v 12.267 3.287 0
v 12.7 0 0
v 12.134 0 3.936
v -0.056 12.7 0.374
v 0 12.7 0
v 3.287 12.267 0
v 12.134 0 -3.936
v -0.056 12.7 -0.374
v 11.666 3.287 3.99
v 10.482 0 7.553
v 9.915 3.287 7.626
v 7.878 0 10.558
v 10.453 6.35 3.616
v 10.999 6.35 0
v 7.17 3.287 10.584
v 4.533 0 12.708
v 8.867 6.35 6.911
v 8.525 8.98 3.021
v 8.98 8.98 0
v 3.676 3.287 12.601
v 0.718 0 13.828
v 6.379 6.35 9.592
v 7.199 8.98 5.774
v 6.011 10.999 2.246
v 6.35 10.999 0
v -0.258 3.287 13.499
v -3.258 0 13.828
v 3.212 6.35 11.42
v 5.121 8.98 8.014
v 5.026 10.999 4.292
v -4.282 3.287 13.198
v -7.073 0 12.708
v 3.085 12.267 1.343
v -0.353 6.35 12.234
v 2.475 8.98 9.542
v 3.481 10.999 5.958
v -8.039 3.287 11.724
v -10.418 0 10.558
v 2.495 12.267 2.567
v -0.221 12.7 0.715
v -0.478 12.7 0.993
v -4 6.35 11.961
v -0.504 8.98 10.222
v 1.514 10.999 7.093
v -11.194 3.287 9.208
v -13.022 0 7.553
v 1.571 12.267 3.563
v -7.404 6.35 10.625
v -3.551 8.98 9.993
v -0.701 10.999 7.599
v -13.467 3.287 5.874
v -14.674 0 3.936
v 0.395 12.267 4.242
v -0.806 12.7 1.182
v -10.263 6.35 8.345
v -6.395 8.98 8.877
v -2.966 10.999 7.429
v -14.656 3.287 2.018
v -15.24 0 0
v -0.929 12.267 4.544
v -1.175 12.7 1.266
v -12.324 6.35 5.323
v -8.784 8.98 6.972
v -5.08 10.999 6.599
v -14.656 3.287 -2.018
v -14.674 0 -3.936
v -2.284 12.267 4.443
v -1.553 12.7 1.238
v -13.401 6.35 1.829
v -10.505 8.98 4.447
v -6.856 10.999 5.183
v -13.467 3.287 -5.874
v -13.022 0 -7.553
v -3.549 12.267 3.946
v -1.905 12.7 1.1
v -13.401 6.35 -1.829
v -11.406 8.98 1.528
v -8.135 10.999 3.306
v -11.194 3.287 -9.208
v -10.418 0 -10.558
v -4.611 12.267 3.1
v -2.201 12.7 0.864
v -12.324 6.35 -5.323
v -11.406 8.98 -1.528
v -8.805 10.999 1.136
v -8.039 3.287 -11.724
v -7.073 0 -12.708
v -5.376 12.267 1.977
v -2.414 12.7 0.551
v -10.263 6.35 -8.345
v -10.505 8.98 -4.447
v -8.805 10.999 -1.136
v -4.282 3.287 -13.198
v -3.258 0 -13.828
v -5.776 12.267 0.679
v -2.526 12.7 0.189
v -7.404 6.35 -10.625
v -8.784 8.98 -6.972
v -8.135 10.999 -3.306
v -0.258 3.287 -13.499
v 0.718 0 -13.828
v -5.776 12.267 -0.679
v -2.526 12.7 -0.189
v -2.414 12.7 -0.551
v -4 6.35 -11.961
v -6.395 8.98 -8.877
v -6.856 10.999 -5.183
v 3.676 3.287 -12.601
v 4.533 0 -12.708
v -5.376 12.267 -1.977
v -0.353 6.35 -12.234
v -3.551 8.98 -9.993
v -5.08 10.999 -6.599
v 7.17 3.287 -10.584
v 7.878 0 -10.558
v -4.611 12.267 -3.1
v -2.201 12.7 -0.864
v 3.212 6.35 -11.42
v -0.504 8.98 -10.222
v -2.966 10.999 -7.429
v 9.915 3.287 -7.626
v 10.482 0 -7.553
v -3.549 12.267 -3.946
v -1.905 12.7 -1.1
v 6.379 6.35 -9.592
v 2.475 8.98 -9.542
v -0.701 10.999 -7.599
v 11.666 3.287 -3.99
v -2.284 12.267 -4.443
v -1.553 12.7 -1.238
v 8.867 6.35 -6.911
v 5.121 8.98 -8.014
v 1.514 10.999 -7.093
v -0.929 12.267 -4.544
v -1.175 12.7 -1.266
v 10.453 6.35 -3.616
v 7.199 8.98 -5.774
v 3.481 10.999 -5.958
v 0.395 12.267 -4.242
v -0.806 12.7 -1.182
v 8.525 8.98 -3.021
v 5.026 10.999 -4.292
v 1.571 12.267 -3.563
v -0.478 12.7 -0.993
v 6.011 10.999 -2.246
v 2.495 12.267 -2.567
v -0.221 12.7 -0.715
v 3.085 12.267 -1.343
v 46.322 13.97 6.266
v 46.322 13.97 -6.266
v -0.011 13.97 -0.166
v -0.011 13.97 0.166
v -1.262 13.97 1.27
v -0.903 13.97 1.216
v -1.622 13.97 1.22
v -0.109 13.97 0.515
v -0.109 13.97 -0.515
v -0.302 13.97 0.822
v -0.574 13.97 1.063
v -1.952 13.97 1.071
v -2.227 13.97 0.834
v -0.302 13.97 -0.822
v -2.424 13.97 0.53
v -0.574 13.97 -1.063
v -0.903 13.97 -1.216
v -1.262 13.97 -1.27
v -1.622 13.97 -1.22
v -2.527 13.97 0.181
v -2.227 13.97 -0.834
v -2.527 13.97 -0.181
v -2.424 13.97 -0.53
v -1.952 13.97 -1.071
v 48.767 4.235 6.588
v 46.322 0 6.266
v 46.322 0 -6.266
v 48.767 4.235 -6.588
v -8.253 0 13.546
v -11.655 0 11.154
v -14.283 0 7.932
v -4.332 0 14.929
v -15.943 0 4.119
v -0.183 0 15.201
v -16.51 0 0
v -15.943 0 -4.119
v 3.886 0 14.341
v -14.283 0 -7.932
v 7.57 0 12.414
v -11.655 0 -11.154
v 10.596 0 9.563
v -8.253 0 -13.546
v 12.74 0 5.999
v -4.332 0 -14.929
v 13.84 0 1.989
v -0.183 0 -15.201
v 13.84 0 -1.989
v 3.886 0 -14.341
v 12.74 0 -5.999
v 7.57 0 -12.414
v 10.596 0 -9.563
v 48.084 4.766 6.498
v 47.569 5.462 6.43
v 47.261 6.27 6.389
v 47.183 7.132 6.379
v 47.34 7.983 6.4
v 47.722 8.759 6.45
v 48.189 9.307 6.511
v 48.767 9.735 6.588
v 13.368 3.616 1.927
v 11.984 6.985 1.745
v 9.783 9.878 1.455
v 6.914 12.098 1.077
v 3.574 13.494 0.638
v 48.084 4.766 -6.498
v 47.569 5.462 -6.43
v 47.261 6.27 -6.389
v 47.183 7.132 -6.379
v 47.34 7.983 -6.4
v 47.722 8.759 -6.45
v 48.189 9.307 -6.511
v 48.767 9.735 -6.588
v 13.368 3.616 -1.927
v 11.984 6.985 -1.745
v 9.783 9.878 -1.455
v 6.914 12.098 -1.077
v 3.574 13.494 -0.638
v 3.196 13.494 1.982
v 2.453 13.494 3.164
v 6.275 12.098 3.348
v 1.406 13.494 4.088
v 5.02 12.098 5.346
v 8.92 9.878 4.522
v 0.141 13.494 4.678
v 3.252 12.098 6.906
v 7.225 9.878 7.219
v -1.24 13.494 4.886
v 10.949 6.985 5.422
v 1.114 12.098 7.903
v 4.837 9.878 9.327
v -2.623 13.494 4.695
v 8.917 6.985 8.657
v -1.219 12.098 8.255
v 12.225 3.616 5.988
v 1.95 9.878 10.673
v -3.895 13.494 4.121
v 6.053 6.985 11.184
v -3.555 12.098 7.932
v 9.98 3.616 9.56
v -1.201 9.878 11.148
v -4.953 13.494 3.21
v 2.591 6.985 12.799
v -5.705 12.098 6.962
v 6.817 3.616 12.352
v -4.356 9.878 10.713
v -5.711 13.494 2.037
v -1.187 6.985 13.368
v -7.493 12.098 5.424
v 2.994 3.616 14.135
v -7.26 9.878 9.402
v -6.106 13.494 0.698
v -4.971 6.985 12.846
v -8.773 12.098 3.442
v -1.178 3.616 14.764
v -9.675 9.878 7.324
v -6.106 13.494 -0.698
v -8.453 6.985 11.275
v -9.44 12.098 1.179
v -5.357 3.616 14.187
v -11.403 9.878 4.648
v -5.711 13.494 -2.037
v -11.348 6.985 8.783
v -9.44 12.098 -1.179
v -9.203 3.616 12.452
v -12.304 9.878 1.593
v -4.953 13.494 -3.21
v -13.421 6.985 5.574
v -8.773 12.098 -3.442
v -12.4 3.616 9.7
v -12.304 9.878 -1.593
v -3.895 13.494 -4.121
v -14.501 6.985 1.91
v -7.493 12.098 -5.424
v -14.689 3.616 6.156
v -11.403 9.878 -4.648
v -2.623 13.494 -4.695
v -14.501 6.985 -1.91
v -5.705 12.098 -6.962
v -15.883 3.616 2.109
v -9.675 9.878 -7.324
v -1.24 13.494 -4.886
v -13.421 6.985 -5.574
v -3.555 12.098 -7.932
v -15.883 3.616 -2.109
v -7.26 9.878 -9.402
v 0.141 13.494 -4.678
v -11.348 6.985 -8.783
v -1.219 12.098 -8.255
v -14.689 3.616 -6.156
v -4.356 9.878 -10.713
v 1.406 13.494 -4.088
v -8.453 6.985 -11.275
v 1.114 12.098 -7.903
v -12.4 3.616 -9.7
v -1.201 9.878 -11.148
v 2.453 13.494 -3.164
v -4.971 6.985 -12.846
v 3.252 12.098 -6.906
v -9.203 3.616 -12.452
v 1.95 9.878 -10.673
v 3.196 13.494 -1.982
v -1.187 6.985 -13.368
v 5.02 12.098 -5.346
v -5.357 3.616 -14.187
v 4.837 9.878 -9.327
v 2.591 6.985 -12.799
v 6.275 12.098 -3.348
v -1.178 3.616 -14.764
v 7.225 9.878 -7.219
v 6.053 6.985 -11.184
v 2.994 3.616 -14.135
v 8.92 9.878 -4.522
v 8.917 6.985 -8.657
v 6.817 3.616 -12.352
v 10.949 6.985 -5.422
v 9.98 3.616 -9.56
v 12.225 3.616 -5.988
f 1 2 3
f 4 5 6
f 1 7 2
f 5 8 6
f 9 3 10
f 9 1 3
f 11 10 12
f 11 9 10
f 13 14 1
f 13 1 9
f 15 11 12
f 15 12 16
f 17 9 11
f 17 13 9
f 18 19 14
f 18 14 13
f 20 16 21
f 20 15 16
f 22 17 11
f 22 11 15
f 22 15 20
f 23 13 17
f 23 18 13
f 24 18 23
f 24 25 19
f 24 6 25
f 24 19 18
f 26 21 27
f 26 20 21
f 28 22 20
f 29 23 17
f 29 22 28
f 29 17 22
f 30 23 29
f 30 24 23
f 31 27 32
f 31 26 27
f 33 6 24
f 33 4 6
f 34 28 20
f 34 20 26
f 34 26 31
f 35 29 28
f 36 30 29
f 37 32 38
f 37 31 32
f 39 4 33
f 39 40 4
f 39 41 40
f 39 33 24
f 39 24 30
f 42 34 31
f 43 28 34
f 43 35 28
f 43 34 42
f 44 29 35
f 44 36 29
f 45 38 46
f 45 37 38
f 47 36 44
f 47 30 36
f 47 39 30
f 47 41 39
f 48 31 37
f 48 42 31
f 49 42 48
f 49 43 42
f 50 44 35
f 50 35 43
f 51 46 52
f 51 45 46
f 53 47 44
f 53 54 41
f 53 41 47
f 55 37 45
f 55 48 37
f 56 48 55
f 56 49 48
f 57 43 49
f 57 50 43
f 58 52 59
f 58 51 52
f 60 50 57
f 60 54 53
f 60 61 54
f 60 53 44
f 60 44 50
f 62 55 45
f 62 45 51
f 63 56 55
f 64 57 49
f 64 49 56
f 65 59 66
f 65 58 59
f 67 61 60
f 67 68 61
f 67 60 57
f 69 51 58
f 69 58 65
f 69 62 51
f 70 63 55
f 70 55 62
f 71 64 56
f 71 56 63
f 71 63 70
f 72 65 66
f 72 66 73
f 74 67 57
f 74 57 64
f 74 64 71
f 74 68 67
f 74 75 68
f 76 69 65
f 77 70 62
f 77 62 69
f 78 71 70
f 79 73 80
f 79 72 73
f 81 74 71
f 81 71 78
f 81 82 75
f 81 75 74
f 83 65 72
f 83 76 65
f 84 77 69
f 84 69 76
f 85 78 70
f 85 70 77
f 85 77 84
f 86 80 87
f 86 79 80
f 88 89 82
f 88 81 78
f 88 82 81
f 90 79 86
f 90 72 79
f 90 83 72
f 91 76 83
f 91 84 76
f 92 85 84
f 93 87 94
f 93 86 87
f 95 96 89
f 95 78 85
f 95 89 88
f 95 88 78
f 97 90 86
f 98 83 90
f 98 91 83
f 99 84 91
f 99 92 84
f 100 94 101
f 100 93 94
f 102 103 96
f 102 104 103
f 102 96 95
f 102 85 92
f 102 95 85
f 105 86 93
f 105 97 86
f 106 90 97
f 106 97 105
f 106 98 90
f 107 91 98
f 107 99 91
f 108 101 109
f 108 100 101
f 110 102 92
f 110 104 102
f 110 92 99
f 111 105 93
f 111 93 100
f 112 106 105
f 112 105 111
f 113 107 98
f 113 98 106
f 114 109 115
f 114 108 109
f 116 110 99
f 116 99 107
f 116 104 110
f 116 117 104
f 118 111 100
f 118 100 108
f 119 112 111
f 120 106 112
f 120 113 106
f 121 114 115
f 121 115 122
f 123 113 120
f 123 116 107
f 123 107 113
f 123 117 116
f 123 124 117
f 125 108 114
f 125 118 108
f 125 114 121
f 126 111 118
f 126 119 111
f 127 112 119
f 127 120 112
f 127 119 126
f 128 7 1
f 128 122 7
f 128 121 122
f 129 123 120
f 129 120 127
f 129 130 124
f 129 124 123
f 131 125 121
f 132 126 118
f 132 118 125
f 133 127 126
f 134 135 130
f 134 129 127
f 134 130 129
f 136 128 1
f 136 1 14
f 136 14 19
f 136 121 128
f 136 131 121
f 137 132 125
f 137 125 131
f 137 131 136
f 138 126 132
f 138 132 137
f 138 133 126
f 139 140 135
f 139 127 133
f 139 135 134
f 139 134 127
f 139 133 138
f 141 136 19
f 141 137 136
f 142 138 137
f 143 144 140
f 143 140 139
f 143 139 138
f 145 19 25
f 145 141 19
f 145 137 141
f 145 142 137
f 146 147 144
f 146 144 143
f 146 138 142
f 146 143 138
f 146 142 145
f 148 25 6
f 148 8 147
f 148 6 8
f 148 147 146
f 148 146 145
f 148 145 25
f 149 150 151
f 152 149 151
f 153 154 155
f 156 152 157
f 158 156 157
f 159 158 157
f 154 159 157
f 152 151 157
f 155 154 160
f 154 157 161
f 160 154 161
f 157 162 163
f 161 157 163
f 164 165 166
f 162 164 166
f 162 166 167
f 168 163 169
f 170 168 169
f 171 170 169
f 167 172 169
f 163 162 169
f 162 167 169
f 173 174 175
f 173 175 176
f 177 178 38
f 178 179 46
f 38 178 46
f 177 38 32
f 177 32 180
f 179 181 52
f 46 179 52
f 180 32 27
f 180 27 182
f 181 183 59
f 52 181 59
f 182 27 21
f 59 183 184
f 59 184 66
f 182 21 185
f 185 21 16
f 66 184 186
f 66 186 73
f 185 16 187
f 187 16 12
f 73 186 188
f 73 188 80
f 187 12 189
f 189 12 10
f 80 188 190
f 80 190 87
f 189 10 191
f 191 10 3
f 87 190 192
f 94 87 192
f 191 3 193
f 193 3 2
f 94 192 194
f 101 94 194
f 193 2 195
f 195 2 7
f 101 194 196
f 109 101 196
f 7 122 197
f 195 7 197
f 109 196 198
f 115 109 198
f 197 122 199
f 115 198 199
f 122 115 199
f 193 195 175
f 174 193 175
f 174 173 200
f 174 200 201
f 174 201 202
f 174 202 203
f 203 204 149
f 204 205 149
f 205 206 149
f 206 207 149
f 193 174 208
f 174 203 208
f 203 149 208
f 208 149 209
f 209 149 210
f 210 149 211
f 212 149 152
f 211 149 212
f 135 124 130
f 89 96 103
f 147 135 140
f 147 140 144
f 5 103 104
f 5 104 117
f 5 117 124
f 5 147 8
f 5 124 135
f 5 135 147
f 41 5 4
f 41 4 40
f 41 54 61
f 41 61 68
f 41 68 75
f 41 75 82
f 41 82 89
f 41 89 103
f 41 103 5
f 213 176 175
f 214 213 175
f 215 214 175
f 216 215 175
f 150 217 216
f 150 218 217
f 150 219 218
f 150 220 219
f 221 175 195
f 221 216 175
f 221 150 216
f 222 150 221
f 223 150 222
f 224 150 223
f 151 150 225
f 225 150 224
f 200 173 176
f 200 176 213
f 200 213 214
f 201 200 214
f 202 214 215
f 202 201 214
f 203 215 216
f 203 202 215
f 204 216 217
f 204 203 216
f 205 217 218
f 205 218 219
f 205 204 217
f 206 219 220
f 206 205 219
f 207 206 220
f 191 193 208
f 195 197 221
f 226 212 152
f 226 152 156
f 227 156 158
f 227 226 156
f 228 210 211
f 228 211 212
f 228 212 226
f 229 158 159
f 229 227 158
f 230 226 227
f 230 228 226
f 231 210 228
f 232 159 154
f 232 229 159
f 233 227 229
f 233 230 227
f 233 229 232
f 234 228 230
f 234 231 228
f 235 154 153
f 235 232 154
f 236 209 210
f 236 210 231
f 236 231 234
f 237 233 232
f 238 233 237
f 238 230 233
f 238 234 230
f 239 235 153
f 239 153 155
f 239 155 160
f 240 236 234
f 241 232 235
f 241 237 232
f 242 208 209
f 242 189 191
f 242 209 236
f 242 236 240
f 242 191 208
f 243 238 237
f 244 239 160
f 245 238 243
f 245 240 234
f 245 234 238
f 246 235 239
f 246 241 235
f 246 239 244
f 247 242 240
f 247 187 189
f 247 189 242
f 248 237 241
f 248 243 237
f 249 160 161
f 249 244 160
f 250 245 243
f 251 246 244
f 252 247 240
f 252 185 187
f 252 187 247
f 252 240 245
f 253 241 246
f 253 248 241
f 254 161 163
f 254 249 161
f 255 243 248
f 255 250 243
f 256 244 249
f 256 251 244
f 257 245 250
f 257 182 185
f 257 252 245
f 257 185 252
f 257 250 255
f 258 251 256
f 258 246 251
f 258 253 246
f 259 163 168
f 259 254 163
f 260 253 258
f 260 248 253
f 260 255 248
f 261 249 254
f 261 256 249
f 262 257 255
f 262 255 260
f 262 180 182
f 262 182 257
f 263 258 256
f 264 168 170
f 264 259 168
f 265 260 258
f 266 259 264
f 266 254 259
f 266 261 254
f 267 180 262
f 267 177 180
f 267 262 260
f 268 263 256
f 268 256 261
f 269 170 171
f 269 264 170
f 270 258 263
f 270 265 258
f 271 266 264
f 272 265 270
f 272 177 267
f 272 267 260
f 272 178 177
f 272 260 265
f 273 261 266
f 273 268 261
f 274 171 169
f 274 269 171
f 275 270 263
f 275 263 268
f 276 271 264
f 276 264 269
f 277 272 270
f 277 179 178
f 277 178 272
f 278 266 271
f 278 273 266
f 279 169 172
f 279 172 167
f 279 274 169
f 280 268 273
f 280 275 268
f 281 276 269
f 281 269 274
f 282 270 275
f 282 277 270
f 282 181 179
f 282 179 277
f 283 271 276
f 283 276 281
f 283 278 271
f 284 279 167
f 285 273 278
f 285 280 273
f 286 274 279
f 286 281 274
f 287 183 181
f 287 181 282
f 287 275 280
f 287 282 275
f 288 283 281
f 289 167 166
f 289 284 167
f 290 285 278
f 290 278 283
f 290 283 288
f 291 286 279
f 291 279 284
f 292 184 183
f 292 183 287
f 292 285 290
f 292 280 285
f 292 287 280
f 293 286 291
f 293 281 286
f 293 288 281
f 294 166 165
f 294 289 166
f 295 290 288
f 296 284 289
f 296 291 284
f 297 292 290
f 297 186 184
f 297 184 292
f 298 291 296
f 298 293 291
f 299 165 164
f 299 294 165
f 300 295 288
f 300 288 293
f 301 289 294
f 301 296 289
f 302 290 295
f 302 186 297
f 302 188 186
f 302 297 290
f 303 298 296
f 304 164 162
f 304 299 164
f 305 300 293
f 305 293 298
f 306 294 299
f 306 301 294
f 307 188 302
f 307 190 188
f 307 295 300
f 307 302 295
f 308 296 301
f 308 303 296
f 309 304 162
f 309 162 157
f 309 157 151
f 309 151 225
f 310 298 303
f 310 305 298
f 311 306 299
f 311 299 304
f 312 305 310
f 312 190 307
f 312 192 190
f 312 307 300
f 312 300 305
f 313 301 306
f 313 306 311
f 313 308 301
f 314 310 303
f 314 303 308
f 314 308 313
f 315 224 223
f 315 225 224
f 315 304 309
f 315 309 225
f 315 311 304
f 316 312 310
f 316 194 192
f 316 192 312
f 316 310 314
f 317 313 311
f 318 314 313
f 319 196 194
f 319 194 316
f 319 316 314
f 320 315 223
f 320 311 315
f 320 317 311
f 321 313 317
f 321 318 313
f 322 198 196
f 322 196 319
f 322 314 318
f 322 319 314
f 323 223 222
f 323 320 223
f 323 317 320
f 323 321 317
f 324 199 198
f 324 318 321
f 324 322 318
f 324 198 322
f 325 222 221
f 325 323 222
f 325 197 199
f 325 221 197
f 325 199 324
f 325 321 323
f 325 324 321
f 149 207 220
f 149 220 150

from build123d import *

# Parameters (mm, degrees)
REVOLVE2_ANGLE           = 7.5
REVOLVE2_OTHER_WAY_ANGLE = 7.5
CUT_EXTRUDE1_DEPTH       = 16.24
CUT_EXTRUDE1_DEPTH_BACK  = 16.24


with BuildPart() as part:
    # Sketch1 → Revolve1 (revolve)
    with BuildSketch(Plane.XY):
        with BuildLine():
            Line((0, 12.7), (-1.27, 12.7))
            Line((-1.27, 12.7), (-1.27, 13.97))
            Line((-1.27, 13.97), (0, 13.97))
            ThreePointArc((0, 13.97), (9.878281733, 9.878281733), (13.97, 0))
            Line((13.97, 0), (12.7, 0))
            ThreePointArc((12.7, 0), (8.980256121, 8.980256121), (0, 12.7))
        make_face()
    revolve(axis=Axis((-1.27, 13.97, 0), (0, -1, 0)))

    # Sketch3 → Revolve2 (revolve)
    with BuildSketch(Plane.XY):
        with BuildLine():
            Line((0, 13.97), (50.8, 13.97))
            Line((50.8, 13.97), (50.8, 0))
            Line((50.8, 0), (13.97, 0))
            ThreePointArc((13.97, 0), (9.878281733, 9.878281733), (0, 13.97))
        make_face()
    revolve(axis=Axis((-1.27, 13.97, 0), (0, -1, 0)), revolution_arc=REVOLVE2_ANGLE)

    # Sketch3 → Revolve2 other way (revolve)
    with BuildSketch(Plane.XY):
        with BuildLine():
            Line((0, 13.97), (50.8, 13.97))
            Line((50.8, 13.97), (50.8, 0))
            Line((50.8, 0), (13.97, 0))
            ThreePointArc((13.97, 0), (9.878281733, 9.878281733), (0, 13.97))
        make_face()
    revolve(axis=Axis((-1.27, 13.97, 0), (0, 1, 0)), revolution_arc=REVOLVE2_OTHER_WAY_ANGLE)

    # Sketch4 → Cut-Extrude1 (cut, two sides)
    with BuildSketch(Plane.XY) as cut_extrude1_sk:
        with BuildLine():
            Line((50.354533932, 13.97), (57.446880617, 13.97))
            Line((57.446880617, 13.97), (57.446880617, -0.511564319))
            Line((57.446880617, -0.511564319), (50.354533932, 0))
            Line((50.354533932, 0), (46.321742301, 0))
            Line((46.321742301, 0), (48.767033932, 4.235369343))
            ThreePointArc((48.767033932, 4.235369343), (47.179533932, 6.985), (48.767033932, 9.734630657))
            Line((48.767033932, 9.734630657), (46.321742301, 13.97))
            Line((46.321742301, 13.97), (50.354533932, 13.97))
        make_face()
    extrude(amount=CUT_EXTRUDE1_DEPTH, mode=Mode.SUBTRACT)
    extrude(cut_extrude1_sk.sketch, amount=-CUT_EXTRUDE1_DEPTH_BACK, mode=Mode.SUBTRACT)


solid = part.part
